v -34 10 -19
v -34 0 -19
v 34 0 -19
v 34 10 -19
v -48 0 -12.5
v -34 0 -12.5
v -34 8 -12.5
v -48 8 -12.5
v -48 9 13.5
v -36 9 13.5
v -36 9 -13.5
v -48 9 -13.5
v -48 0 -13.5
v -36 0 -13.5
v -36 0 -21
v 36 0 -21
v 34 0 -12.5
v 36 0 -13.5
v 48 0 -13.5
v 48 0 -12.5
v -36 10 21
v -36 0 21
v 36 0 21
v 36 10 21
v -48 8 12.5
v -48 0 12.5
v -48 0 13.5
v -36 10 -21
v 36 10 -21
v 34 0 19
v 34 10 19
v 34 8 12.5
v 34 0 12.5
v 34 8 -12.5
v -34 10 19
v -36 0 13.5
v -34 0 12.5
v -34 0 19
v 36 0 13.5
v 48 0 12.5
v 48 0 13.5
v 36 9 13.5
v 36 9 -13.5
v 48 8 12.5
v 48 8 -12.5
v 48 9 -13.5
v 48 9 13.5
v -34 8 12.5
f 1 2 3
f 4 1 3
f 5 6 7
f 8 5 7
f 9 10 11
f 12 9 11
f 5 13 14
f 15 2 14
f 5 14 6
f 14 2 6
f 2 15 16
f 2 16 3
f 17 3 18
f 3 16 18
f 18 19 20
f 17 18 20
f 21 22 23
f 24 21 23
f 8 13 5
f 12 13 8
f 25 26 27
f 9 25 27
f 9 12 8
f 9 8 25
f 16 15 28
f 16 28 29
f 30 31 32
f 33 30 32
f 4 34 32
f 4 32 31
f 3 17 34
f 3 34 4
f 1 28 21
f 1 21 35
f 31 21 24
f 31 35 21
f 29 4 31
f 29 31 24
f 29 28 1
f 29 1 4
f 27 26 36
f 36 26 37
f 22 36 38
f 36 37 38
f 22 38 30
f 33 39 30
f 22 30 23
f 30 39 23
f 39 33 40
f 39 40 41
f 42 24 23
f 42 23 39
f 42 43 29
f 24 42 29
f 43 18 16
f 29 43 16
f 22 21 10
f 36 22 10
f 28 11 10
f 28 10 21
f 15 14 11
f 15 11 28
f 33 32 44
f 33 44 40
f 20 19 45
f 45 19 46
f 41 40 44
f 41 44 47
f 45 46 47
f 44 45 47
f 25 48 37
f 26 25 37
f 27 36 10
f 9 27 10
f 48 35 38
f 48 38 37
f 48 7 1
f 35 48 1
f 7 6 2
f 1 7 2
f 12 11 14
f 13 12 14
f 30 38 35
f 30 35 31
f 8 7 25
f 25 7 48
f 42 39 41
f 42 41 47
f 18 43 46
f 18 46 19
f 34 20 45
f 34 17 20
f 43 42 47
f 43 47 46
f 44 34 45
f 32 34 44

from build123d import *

# Parameters (mm, degrees)
SKETCH_1_W          = 72
SKETCH_1_H          = 42
SKETCH_1_W_2        = 68
SKETCH_1_H_2        = 38
EXTRUDE_1_DEPTH     = 10
SKETCH_2_W          = 25
SKETCH_2_H          = 8
CUT_EXTRUDE_1_DEPTH = 81
EXTRUDE_4_DEPTH     = 12
EXTRUDE_5_DEPTH     = 12


with BuildPart() as part:
    # 草圖1 → 填料-伸長1 (new body)
    with BuildSketch(Plane(origin=(0, 0, 0), x_dir=(1, 0, 0), z_dir=(0, 1, 0))):
        Rectangle(SKETCH_1_W, SKETCH_1_H)
        Rectangle(SKETCH_1_W_2, SKETCH_1_H_2, mode=Mode.SUBTRACT)
    extrude(amount=EXTRUDE_1_DEPTH)

    # 草圖2 → 除料-伸長1 (cut)
    with BuildSketch(Plane(origin=(36, 0, 0), x_dir=(0, 0, -1), z_dir=(1, 0, 0))):
        with Locations((0, 4)):
            Rectangle(SKETCH_2_W, SKETCH_2_H)
    extrude(amount=-CUT_EXTRUDE_1_DEPTH, mode=Mode.SUBTRACT)

    # 草圖7 → 填料-伸長4 (add)
    with BuildSketch(Plane(origin=(36, 0, 0), x_dir=(0, 0, -1), z_dir=(1, 0, 0))):
        Polygon((12.5, 0), (12.5, 8), (-12.5, 8), (-12.5, 0), (-13.5, 0), (-13.5, 9), (13.5, 9), (13.5, 0), align=None)
    extrude(amount=EXTRUDE_4_DEPTH)

    # 草圖9 → 填料-伸長5 (add)
    with BuildSketch(Plane.ZY.offset(36)):
        Polygon((12.5, 8), (12.5, 0), (13.5, 0), (13.5, 9), (-13.5, 9), (-13.5, 0), (-12.5, 0), (-12.5, 8), align=None)
    extrude(amount=EXTRUDE_5_DEPTH)


solid = part.part
